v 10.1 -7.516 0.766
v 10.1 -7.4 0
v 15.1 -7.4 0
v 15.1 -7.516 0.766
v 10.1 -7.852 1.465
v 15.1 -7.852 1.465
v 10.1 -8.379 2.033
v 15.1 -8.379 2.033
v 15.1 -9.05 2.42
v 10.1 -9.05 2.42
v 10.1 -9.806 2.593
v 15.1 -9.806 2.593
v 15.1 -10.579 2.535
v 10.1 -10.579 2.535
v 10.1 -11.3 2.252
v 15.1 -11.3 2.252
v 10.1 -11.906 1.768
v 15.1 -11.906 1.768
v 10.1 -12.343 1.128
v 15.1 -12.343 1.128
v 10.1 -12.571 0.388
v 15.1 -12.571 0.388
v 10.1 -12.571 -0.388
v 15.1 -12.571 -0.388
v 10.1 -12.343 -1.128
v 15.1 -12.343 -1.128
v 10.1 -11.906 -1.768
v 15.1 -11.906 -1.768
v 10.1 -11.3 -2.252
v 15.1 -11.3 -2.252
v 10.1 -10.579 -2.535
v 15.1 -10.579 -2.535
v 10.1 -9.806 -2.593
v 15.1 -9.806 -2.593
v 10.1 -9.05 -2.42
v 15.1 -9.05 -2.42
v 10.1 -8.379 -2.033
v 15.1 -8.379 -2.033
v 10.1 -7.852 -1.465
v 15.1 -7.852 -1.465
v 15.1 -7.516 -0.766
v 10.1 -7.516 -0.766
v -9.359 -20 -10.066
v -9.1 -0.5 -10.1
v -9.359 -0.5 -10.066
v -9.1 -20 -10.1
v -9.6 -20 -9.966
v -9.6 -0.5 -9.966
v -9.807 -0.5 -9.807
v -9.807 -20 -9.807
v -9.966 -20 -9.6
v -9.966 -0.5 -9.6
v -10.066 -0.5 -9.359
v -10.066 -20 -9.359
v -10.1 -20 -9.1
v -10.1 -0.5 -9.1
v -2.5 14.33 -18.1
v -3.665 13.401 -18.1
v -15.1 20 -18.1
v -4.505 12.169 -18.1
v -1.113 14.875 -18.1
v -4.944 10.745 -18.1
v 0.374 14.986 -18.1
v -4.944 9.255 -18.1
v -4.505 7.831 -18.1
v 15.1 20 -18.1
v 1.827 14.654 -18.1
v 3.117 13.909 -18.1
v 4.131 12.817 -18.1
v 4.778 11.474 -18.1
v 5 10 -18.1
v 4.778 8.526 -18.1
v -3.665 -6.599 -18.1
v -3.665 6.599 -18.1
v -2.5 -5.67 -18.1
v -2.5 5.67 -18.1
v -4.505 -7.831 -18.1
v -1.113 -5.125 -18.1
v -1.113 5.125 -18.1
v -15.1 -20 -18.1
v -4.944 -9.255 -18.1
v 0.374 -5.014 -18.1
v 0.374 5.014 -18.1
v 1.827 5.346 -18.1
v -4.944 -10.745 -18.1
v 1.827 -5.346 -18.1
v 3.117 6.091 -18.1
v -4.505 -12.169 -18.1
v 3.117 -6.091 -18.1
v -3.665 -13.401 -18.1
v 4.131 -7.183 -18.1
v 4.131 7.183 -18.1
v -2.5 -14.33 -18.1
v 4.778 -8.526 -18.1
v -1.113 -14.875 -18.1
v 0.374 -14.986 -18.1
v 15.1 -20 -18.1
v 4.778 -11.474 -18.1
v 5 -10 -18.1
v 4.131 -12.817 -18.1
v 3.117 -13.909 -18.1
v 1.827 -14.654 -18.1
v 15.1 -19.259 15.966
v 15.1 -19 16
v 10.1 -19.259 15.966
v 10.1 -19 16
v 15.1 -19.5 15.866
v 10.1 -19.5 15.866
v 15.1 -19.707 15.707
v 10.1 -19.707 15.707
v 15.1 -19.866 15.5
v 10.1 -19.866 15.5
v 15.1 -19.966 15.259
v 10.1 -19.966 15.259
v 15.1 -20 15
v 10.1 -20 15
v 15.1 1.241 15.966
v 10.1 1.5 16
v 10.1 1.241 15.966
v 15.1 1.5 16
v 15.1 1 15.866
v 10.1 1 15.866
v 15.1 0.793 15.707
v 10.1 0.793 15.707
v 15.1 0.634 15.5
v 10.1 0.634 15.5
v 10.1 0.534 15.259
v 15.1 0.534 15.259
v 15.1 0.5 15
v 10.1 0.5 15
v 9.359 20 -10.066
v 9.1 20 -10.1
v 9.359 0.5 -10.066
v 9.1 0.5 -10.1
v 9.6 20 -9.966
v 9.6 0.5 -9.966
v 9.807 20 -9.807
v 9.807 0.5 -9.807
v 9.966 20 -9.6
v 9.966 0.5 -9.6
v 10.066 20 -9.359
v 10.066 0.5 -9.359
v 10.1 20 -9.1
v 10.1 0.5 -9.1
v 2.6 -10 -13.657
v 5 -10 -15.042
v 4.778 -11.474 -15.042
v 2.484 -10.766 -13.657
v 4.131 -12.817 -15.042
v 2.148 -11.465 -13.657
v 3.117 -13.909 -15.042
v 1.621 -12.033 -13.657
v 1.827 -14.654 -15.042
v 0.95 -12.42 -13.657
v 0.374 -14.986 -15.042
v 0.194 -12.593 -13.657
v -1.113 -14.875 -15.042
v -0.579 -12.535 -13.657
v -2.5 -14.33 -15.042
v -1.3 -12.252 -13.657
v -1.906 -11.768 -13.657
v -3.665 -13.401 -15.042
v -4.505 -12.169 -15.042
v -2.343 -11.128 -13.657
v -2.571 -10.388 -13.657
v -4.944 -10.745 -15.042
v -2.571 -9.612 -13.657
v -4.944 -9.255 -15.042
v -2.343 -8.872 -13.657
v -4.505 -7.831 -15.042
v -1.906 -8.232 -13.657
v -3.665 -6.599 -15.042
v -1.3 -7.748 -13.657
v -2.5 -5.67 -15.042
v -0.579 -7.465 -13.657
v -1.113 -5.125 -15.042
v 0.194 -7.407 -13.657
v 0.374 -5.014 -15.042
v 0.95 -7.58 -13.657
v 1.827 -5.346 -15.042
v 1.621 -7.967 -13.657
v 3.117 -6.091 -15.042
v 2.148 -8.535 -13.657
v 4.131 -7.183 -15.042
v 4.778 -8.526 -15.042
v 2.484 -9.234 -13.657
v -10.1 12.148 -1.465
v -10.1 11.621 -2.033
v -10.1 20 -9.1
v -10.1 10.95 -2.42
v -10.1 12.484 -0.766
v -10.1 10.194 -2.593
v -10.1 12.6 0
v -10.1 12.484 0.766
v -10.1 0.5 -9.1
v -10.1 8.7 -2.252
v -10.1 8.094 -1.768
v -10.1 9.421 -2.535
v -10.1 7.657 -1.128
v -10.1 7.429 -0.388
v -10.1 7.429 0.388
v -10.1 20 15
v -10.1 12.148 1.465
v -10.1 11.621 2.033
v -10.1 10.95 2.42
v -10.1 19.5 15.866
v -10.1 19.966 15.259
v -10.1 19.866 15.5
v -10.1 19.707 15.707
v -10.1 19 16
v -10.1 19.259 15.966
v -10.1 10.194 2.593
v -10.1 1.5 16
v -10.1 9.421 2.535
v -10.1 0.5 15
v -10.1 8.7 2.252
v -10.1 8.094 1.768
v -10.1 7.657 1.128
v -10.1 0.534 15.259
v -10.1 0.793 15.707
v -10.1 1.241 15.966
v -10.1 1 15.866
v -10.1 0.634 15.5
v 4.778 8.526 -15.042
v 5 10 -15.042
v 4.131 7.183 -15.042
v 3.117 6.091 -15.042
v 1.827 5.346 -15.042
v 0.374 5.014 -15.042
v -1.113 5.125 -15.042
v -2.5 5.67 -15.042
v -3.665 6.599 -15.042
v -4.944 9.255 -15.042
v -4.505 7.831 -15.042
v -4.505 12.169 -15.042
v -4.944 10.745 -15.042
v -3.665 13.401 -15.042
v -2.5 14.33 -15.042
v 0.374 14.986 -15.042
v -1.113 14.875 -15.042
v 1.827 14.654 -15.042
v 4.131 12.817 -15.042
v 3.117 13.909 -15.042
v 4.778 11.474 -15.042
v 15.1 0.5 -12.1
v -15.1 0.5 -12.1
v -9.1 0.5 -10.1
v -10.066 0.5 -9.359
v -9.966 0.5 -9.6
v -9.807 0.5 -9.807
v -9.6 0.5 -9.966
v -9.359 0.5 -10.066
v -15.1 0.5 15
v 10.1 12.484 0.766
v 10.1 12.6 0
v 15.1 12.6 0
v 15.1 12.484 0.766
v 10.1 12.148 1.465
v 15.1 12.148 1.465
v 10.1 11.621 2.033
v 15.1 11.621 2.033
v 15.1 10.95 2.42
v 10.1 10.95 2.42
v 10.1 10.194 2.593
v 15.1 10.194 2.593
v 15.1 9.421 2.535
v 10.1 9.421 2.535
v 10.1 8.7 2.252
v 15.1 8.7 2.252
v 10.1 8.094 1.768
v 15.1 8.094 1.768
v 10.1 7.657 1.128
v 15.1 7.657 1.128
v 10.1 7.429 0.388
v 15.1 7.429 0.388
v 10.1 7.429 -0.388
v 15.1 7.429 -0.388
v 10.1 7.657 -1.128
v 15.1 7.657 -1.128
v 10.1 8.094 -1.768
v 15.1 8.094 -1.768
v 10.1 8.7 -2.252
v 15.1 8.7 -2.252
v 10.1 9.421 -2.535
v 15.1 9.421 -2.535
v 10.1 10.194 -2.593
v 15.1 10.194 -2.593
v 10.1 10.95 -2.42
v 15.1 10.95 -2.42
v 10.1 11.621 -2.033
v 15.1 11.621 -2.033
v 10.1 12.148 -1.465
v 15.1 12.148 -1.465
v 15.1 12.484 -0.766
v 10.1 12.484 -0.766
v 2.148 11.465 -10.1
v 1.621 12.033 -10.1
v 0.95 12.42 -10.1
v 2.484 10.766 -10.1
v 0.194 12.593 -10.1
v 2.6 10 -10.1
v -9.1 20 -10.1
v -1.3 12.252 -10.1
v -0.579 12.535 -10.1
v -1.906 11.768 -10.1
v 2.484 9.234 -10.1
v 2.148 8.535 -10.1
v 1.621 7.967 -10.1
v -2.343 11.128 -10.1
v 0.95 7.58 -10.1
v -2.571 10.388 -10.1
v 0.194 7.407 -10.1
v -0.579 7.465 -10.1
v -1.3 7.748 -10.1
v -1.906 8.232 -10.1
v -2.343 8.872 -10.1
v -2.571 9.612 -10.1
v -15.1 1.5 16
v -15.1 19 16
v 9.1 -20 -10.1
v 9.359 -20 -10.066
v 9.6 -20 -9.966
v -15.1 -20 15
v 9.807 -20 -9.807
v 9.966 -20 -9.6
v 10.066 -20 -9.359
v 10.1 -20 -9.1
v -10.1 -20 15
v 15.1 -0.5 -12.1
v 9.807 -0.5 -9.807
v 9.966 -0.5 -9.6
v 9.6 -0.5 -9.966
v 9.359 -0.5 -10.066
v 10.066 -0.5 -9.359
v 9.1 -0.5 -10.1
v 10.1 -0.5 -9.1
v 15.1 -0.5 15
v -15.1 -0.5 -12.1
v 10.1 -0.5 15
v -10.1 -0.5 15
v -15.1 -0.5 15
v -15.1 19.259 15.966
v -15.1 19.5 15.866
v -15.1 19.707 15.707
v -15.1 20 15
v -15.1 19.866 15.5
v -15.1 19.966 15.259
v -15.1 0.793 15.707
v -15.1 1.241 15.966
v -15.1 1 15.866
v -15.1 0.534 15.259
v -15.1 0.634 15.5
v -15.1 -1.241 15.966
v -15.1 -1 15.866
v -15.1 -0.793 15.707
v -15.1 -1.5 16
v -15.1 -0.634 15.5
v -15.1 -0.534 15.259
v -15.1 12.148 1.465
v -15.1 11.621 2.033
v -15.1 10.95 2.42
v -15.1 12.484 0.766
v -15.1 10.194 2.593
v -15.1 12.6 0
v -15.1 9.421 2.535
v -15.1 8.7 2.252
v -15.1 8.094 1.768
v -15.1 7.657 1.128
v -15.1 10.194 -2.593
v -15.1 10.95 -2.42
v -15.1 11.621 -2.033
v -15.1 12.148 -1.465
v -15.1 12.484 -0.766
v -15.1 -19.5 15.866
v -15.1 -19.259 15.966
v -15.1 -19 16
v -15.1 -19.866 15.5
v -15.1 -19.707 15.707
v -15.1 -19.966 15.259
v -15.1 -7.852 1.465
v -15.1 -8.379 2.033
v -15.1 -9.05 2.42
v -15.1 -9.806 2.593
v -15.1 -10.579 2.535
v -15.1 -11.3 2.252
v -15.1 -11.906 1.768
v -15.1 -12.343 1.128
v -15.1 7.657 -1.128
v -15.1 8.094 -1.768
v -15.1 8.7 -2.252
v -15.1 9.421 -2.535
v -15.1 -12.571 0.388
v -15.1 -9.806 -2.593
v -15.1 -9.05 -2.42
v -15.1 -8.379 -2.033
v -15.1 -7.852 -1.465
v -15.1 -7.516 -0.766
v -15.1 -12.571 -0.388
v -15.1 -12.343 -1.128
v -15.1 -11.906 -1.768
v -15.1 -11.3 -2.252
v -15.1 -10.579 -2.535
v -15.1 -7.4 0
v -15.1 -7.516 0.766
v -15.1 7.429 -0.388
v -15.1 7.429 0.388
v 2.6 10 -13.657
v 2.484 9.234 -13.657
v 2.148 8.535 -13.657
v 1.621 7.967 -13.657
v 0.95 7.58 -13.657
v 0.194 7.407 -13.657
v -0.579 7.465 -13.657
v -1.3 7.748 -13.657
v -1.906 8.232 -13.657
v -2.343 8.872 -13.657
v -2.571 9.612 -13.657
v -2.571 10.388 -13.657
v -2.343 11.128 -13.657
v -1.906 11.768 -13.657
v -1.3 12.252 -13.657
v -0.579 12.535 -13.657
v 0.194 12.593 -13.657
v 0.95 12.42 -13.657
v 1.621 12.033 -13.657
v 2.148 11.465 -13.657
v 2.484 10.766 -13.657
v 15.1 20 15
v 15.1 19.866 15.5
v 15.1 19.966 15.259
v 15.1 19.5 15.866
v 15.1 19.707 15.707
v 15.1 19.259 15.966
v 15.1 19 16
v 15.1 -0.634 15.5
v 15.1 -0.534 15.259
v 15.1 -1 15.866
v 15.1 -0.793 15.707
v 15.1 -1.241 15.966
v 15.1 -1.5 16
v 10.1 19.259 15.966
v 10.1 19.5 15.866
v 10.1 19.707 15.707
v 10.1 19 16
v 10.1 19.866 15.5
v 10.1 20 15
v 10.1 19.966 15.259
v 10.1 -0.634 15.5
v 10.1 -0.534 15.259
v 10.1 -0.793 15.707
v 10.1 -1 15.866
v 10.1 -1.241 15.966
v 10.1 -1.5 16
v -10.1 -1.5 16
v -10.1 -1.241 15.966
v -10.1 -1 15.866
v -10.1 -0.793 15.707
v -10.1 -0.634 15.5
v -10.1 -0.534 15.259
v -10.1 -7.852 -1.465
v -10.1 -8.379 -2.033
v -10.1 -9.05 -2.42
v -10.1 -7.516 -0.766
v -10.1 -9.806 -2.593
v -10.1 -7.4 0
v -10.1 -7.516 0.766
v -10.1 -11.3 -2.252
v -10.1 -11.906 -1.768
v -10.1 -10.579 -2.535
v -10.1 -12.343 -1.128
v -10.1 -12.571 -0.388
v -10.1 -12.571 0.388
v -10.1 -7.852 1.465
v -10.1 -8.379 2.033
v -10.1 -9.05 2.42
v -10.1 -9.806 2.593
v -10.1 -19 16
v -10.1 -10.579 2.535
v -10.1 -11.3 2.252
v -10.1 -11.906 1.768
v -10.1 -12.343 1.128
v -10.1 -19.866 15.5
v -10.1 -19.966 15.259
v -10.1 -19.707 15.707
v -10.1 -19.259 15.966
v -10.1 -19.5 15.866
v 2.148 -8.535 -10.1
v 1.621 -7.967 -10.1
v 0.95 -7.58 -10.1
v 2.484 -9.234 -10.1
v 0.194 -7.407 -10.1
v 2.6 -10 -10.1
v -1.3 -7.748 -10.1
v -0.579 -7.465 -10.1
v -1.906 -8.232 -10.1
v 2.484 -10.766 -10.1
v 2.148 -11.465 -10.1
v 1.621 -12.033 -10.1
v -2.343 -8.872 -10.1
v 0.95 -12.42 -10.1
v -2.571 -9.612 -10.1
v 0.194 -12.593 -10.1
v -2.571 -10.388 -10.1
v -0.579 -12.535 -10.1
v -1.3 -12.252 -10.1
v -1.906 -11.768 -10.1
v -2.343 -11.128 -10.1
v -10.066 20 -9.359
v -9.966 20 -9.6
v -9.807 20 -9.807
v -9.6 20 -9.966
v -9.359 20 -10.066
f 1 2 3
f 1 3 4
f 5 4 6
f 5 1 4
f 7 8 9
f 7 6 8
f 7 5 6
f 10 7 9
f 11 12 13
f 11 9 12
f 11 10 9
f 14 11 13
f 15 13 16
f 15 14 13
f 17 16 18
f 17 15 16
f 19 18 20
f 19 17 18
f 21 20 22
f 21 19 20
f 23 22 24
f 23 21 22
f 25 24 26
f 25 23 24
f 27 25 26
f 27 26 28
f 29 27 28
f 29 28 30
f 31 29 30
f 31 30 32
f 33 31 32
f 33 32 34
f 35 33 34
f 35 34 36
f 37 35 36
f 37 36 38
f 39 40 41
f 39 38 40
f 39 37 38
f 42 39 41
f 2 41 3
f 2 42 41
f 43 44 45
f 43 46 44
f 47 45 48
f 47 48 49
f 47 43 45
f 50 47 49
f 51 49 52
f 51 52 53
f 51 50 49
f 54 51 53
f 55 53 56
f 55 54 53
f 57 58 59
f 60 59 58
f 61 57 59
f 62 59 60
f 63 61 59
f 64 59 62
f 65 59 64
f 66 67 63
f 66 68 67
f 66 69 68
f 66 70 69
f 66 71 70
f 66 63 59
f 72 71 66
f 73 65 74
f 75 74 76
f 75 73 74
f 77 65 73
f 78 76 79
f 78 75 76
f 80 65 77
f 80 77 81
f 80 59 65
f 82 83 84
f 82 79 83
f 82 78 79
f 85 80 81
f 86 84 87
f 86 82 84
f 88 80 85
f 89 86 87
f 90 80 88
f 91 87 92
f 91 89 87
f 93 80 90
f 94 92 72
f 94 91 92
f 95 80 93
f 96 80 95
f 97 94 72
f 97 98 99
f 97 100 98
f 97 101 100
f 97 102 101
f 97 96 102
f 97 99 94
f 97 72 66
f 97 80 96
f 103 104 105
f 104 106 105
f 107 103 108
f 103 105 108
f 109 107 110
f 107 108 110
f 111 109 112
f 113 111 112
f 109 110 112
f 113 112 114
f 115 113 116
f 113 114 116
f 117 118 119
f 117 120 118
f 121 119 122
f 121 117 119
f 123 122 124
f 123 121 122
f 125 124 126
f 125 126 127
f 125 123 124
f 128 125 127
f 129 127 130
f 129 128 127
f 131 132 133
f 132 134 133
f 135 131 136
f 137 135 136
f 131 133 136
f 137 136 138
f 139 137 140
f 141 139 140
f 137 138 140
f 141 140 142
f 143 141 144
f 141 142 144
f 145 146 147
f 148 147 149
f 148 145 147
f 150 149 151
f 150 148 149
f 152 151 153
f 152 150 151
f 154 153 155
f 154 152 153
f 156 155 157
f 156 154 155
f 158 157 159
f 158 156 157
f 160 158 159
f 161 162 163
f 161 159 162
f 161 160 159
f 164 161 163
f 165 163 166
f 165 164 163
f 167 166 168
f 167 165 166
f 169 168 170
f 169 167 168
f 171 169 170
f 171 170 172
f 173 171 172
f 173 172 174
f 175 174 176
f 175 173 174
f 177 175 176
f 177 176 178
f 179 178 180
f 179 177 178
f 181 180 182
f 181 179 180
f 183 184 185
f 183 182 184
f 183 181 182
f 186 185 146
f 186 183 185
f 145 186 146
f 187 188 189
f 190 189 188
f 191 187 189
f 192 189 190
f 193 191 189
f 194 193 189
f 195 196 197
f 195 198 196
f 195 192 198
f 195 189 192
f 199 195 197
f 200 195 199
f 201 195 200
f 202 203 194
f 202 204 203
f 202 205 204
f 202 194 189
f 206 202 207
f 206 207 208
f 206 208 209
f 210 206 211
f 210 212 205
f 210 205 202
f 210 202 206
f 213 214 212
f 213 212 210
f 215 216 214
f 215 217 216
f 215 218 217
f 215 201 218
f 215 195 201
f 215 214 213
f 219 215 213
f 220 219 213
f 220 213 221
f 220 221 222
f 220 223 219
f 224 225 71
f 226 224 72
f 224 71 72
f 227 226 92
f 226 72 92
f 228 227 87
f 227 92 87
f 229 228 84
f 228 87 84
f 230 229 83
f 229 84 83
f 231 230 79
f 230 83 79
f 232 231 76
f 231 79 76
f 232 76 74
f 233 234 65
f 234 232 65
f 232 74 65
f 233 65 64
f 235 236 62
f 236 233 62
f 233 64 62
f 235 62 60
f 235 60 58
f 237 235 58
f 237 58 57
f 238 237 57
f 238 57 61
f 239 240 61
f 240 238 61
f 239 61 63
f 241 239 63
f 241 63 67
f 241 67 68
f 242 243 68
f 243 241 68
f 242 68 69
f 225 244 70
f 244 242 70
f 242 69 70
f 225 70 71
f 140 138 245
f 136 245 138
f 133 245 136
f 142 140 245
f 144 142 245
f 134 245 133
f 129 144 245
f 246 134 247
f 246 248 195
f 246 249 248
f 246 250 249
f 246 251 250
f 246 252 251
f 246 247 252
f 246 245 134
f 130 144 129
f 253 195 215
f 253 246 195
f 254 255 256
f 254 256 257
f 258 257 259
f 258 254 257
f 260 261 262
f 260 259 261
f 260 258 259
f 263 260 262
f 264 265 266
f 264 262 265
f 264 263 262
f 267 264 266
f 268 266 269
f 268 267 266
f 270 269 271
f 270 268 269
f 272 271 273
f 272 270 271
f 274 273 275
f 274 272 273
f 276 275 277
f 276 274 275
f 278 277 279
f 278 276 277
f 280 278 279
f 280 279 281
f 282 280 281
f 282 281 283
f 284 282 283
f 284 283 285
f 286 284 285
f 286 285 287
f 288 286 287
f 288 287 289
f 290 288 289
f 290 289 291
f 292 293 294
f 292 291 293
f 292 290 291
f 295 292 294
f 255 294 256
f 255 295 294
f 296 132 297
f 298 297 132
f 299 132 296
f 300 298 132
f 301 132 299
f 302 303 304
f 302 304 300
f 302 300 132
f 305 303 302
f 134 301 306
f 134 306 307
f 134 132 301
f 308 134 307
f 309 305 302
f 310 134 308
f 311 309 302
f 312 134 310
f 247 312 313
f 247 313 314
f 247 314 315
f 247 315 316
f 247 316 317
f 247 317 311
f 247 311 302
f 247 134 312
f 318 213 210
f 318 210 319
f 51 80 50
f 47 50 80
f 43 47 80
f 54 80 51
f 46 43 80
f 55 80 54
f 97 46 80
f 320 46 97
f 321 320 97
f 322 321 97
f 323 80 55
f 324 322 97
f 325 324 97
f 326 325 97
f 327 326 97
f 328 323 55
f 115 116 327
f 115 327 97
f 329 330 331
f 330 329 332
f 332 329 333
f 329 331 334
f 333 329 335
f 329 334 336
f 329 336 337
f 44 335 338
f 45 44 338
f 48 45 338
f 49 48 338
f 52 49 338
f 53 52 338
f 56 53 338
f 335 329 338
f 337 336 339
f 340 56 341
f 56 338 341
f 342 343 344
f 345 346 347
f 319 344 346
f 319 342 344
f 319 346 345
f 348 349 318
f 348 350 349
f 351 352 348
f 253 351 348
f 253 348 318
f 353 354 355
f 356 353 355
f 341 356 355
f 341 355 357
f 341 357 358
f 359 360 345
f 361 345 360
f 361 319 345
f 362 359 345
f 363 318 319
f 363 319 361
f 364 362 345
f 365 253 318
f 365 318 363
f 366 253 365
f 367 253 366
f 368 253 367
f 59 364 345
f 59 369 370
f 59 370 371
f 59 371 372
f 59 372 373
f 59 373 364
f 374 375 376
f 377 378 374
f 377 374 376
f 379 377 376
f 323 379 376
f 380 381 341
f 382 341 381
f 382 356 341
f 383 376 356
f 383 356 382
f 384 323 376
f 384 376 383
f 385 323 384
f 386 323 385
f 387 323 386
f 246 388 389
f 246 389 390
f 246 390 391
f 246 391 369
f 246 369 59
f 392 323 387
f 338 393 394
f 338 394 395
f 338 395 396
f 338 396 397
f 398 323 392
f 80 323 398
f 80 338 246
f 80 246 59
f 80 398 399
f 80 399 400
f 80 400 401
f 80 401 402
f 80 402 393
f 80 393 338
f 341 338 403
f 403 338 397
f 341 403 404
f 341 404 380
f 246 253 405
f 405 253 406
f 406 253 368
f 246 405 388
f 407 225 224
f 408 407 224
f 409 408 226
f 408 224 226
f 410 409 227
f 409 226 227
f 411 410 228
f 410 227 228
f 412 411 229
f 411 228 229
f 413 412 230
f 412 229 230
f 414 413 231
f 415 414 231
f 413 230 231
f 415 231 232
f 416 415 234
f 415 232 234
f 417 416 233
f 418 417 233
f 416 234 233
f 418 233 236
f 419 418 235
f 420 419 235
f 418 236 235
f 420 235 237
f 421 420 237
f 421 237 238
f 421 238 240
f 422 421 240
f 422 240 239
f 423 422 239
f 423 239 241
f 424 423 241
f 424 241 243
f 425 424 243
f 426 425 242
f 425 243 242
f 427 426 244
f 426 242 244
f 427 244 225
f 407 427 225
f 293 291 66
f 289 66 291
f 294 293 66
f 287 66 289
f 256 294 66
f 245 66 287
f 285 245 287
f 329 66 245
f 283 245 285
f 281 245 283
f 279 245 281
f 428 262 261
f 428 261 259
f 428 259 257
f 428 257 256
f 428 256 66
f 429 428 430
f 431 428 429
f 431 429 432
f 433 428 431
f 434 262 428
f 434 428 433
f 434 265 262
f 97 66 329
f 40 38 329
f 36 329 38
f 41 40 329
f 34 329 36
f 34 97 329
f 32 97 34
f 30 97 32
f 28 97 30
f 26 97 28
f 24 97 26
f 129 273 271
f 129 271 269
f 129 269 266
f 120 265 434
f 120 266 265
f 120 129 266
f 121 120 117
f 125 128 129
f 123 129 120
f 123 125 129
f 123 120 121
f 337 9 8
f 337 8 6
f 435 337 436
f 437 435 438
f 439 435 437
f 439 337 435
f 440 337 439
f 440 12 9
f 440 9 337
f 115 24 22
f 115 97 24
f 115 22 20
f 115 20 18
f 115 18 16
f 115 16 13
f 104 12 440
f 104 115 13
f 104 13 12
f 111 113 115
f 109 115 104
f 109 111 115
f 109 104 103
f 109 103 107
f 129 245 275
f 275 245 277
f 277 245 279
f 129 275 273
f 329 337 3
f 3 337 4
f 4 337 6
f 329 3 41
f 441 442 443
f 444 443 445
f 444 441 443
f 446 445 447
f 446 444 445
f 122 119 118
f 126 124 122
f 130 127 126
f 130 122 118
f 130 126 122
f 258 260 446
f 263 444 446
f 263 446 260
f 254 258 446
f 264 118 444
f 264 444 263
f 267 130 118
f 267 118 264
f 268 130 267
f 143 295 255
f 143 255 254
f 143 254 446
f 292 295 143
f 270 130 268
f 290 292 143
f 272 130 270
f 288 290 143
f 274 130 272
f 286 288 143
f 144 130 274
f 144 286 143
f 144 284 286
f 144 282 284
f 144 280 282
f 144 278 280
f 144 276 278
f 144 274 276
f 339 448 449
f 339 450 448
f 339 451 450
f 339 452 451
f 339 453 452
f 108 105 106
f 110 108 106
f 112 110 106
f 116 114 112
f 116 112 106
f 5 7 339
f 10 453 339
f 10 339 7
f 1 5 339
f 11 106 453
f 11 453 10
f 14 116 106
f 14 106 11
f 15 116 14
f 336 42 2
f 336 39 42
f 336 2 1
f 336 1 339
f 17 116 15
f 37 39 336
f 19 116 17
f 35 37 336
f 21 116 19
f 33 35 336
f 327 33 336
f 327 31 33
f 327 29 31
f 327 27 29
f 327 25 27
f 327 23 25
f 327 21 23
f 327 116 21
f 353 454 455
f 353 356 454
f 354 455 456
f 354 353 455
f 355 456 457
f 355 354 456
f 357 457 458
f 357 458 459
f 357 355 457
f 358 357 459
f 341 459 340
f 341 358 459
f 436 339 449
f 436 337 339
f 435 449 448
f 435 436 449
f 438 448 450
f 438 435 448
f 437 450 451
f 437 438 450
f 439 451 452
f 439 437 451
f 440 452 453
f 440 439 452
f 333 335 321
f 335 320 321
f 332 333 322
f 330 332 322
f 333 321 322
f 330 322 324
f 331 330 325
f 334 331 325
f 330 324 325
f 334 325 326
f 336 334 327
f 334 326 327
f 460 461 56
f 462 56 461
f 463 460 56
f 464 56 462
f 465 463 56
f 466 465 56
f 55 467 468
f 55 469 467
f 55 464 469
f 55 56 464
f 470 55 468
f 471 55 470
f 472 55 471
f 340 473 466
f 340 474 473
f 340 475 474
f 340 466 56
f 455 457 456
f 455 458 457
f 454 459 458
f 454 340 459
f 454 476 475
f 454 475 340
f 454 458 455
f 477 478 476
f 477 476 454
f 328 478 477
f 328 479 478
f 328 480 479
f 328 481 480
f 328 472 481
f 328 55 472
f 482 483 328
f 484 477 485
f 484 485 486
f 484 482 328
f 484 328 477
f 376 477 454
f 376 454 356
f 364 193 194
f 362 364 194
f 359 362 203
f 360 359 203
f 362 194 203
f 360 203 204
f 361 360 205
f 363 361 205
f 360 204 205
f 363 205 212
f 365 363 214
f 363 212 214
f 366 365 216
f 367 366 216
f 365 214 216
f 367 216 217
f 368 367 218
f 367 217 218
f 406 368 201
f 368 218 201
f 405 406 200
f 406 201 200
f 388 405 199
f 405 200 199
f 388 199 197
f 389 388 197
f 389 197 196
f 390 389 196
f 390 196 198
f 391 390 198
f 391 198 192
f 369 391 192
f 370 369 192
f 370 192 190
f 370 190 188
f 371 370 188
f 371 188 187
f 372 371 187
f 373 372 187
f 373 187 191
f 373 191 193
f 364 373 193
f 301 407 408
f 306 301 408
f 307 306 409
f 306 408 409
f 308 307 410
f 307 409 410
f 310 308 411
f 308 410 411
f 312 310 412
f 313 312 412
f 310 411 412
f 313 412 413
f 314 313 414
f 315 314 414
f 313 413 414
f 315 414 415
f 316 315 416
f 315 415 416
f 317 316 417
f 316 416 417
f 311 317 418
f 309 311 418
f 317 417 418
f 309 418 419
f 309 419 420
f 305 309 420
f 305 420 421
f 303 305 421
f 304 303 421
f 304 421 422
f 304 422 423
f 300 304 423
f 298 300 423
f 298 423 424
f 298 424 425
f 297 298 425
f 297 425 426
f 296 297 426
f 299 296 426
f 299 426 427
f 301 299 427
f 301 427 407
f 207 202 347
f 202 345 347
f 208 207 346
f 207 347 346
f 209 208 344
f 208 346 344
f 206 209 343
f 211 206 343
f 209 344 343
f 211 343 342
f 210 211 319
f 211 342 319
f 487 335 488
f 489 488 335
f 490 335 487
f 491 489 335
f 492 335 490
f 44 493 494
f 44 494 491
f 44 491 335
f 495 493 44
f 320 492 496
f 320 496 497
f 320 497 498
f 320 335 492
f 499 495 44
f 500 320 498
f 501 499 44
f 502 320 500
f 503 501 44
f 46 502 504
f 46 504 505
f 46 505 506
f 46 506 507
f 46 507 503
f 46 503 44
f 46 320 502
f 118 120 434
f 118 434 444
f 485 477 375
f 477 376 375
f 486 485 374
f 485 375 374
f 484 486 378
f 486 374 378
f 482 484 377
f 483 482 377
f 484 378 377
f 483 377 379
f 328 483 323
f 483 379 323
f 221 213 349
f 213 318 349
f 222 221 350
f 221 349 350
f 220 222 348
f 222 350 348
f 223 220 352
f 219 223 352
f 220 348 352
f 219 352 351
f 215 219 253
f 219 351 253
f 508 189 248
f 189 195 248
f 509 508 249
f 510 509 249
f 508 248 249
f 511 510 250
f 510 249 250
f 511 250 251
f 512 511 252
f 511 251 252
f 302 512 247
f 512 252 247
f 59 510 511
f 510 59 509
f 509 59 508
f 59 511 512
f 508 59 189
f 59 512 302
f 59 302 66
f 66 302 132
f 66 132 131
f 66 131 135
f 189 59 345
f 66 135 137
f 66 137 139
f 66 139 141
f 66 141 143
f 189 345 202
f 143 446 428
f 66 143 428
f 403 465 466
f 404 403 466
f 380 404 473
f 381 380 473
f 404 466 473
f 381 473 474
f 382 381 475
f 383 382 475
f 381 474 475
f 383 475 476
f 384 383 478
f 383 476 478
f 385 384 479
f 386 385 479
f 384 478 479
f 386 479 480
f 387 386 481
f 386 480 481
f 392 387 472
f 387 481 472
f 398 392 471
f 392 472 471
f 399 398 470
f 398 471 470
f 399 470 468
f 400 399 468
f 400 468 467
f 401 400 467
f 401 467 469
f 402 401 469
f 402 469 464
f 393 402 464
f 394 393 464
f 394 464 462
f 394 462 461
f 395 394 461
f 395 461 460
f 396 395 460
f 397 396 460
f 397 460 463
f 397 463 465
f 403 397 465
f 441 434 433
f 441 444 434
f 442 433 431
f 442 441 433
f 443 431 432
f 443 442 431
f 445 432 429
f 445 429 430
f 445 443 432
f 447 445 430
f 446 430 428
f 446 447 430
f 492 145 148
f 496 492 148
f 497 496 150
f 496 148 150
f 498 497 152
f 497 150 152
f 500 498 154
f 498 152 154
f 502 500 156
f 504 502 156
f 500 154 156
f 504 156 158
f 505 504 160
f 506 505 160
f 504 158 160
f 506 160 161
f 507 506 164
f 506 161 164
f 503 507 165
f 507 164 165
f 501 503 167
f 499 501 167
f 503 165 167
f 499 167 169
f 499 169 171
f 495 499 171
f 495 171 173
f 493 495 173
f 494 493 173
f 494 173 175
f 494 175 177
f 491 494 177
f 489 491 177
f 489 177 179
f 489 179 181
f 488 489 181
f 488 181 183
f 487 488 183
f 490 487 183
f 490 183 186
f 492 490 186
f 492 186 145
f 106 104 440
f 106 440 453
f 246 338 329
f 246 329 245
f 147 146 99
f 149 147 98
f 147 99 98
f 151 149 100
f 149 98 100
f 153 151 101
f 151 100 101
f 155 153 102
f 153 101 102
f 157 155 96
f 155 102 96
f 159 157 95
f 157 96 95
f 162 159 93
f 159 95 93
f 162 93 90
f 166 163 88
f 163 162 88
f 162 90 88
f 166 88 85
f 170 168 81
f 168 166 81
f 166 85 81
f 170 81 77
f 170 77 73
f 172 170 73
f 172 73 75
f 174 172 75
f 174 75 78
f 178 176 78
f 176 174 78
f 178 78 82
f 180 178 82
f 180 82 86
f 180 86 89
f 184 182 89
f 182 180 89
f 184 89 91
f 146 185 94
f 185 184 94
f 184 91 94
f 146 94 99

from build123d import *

# Parameters (mm, degrees)
F2_DEPTH      = 20
F3_W          = 1
F3_H          = 28.1
F4_DEPTH      = 15.101
F4_DEPTH_BACK = 15.101
F5_R          = 2.6
F6_DEPTH      = 15.101
F6_DEPTH_BACK = 15.101
F7_R          = 2.6
F8_DEPTH      = 8
F9_R          = 5
F10_DEPTH     = 3
F11_S5_R      = 5
F11_T6_DEPTH  = 9
F11_S11_R     = 5
F11_T12_DEPTH = 9
F12_R         = 1


# Not quite as in the source:
# - a fillet or chamfer that OpenCascade refuses, or shapes differently, is made with other operations: its cross-section is extruded or revolved along the edge and cut away or added


with BuildPart() as f2:
    # F1 (on Front) → F2 (new body, symmetric)
    with BuildSketch(Plane.XZ):
        Polygon((15.1, 16), (10.1, 16), (10.1, -10.1), (-10.1, -10.1), (-10.1, 16), (-15.1, 16), (-15.1, -18.1), (15.1, -18.1), align=None)
    extrude(amount=F2_DEPTH, both=True)

    # F3 (on Right) → F4 (cut, two sides)
    with BuildSketch(Plane.YZ) as f4_sk:
        with Locations((0, 1.95)):
            Rectangle(F3_W, F3_H)
    extrude(amount=-F4_DEPTH, mode=Mode.SUBTRACT)
    extrude(f4_sk.sketch, amount=F4_DEPTH_BACK, mode=Mode.SUBTRACT)

    # F5 (on Right) → F6 (cut, two sides)
    with BuildSketch(Plane.YZ) as f6_sk:
        with Locations((10, 0)):
            Circle(F5_R)
        with Locations((-10, 0)):
            Circle(F5_R)
    extrude(amount=-F6_DEPTH, mode=Mode.SUBTRACT)
    extrude(f6_sk.sketch, amount=F6_DEPTH_BACK, mode=Mode.SUBTRACT)

    # F7 (on face) → F8 (cut, through all)
    with BuildSketch(Plane(origin=(0, 0, -18.1), x_dir=(1, 0, 0), z_dir=(0, 0, -1))):
        with Locations((0, 10)):
            Circle(F7_R)
        with Locations((0, -10)):
            Circle(F7_R)
    extrude(amount=-F8_DEPTH, mode=Mode.SUBTRACT)

    # F9 (on face) → F10 (cut)
    with BuildSketch(Plane(origin=(0, 0, -18.1), x_dir=(1, 0, 0), z_dir=(0, 0, -1))):
        with Locations((0, 10)):
            Circle(F9_R)
        with Locations((0, -10)):
            Circle(F9_R)
    extrude(amount=-F10_DEPTH, mode=Mode.SUBTRACT)

    # F11: chamfer of 2.5 x 1.443375673 on 2 edges, made by hand


with BuildPart() as f11_tool2:
    # F11_s3 → F11_t4 (revolve)
    with BuildSketch(Plane.XZ.offset(10)):
        Polygon((5.1, -15.1), (2.6, -13.656624327), (2.6, -15.1), align=None)
    revolve(axis=Axis((0, -10, -15.1), (0, 0, -1)))

    # F11_s5 → F11_t6 (intersect, symmetric)
    with BuildSketch(Plane.XY.offset(-14.4)):
        with Locations((0, -10)):
            Circle(F11_S5_R)
    extrude(amount=F11_T6_DEPTH, both=True, mode=Mode.INTERSECT)


with BuildPart() as f2_1:
    add(f2.part)

    # F11_t1: cut F11_tool2
    add(f11_tool2.part, mode=Mode.SUBTRACT)


with BuildPart() as f11_tool8:
    # F11_s9 → F11_t10 (revolve)
    with BuildSketch(Plane.XZ.offset(-10)):
        Polygon((2.6, -13.656624327), (5.1, -15.1), (2.6, -15.1), align=None)
    revolve(axis=Axis((0, 10, -15.1), (0, 0, -1)))

    # F11_s11 → F11_t12 (intersect, symmetric)
    with BuildSketch(Plane.XY.offset(-14.4)):
        with Locations((0, 10)):
            Circle(F11_S11_R)
    extrude(amount=F11_T12_DEPTH, both=True, mode=Mode.INTERSECT)


with BuildPart() as f2_2:
    add(f2_1.part)

    # F11_t7: cut F11_tool8
    add(f11_tool8.part, mode=Mode.SUBTRACT)

    # F12
    f12_edges = [f2_2.edges().sort_by_distance(p)[0] for p in [
        (-10.1, -10.25, -10.1),
        (-10.1, 10.25, -10.1),
        (10.1, -10.25, -10.1),
        (10.1, 10.25, -10.1),
        (-12.6, 20, 16),
        (12.6, 0.5, 16),
        (-12.6, 0.5, 16),
        (12.6, -0.5, 16),
        (-12.6, -0.5, 16),
        (-12.6, -20, 16),
        (12.6, 20, 16),
        (12.6, -20, 16),
    ]]
    fillet(f12_edges, radius=F12_R)


solid = f2_2.part
